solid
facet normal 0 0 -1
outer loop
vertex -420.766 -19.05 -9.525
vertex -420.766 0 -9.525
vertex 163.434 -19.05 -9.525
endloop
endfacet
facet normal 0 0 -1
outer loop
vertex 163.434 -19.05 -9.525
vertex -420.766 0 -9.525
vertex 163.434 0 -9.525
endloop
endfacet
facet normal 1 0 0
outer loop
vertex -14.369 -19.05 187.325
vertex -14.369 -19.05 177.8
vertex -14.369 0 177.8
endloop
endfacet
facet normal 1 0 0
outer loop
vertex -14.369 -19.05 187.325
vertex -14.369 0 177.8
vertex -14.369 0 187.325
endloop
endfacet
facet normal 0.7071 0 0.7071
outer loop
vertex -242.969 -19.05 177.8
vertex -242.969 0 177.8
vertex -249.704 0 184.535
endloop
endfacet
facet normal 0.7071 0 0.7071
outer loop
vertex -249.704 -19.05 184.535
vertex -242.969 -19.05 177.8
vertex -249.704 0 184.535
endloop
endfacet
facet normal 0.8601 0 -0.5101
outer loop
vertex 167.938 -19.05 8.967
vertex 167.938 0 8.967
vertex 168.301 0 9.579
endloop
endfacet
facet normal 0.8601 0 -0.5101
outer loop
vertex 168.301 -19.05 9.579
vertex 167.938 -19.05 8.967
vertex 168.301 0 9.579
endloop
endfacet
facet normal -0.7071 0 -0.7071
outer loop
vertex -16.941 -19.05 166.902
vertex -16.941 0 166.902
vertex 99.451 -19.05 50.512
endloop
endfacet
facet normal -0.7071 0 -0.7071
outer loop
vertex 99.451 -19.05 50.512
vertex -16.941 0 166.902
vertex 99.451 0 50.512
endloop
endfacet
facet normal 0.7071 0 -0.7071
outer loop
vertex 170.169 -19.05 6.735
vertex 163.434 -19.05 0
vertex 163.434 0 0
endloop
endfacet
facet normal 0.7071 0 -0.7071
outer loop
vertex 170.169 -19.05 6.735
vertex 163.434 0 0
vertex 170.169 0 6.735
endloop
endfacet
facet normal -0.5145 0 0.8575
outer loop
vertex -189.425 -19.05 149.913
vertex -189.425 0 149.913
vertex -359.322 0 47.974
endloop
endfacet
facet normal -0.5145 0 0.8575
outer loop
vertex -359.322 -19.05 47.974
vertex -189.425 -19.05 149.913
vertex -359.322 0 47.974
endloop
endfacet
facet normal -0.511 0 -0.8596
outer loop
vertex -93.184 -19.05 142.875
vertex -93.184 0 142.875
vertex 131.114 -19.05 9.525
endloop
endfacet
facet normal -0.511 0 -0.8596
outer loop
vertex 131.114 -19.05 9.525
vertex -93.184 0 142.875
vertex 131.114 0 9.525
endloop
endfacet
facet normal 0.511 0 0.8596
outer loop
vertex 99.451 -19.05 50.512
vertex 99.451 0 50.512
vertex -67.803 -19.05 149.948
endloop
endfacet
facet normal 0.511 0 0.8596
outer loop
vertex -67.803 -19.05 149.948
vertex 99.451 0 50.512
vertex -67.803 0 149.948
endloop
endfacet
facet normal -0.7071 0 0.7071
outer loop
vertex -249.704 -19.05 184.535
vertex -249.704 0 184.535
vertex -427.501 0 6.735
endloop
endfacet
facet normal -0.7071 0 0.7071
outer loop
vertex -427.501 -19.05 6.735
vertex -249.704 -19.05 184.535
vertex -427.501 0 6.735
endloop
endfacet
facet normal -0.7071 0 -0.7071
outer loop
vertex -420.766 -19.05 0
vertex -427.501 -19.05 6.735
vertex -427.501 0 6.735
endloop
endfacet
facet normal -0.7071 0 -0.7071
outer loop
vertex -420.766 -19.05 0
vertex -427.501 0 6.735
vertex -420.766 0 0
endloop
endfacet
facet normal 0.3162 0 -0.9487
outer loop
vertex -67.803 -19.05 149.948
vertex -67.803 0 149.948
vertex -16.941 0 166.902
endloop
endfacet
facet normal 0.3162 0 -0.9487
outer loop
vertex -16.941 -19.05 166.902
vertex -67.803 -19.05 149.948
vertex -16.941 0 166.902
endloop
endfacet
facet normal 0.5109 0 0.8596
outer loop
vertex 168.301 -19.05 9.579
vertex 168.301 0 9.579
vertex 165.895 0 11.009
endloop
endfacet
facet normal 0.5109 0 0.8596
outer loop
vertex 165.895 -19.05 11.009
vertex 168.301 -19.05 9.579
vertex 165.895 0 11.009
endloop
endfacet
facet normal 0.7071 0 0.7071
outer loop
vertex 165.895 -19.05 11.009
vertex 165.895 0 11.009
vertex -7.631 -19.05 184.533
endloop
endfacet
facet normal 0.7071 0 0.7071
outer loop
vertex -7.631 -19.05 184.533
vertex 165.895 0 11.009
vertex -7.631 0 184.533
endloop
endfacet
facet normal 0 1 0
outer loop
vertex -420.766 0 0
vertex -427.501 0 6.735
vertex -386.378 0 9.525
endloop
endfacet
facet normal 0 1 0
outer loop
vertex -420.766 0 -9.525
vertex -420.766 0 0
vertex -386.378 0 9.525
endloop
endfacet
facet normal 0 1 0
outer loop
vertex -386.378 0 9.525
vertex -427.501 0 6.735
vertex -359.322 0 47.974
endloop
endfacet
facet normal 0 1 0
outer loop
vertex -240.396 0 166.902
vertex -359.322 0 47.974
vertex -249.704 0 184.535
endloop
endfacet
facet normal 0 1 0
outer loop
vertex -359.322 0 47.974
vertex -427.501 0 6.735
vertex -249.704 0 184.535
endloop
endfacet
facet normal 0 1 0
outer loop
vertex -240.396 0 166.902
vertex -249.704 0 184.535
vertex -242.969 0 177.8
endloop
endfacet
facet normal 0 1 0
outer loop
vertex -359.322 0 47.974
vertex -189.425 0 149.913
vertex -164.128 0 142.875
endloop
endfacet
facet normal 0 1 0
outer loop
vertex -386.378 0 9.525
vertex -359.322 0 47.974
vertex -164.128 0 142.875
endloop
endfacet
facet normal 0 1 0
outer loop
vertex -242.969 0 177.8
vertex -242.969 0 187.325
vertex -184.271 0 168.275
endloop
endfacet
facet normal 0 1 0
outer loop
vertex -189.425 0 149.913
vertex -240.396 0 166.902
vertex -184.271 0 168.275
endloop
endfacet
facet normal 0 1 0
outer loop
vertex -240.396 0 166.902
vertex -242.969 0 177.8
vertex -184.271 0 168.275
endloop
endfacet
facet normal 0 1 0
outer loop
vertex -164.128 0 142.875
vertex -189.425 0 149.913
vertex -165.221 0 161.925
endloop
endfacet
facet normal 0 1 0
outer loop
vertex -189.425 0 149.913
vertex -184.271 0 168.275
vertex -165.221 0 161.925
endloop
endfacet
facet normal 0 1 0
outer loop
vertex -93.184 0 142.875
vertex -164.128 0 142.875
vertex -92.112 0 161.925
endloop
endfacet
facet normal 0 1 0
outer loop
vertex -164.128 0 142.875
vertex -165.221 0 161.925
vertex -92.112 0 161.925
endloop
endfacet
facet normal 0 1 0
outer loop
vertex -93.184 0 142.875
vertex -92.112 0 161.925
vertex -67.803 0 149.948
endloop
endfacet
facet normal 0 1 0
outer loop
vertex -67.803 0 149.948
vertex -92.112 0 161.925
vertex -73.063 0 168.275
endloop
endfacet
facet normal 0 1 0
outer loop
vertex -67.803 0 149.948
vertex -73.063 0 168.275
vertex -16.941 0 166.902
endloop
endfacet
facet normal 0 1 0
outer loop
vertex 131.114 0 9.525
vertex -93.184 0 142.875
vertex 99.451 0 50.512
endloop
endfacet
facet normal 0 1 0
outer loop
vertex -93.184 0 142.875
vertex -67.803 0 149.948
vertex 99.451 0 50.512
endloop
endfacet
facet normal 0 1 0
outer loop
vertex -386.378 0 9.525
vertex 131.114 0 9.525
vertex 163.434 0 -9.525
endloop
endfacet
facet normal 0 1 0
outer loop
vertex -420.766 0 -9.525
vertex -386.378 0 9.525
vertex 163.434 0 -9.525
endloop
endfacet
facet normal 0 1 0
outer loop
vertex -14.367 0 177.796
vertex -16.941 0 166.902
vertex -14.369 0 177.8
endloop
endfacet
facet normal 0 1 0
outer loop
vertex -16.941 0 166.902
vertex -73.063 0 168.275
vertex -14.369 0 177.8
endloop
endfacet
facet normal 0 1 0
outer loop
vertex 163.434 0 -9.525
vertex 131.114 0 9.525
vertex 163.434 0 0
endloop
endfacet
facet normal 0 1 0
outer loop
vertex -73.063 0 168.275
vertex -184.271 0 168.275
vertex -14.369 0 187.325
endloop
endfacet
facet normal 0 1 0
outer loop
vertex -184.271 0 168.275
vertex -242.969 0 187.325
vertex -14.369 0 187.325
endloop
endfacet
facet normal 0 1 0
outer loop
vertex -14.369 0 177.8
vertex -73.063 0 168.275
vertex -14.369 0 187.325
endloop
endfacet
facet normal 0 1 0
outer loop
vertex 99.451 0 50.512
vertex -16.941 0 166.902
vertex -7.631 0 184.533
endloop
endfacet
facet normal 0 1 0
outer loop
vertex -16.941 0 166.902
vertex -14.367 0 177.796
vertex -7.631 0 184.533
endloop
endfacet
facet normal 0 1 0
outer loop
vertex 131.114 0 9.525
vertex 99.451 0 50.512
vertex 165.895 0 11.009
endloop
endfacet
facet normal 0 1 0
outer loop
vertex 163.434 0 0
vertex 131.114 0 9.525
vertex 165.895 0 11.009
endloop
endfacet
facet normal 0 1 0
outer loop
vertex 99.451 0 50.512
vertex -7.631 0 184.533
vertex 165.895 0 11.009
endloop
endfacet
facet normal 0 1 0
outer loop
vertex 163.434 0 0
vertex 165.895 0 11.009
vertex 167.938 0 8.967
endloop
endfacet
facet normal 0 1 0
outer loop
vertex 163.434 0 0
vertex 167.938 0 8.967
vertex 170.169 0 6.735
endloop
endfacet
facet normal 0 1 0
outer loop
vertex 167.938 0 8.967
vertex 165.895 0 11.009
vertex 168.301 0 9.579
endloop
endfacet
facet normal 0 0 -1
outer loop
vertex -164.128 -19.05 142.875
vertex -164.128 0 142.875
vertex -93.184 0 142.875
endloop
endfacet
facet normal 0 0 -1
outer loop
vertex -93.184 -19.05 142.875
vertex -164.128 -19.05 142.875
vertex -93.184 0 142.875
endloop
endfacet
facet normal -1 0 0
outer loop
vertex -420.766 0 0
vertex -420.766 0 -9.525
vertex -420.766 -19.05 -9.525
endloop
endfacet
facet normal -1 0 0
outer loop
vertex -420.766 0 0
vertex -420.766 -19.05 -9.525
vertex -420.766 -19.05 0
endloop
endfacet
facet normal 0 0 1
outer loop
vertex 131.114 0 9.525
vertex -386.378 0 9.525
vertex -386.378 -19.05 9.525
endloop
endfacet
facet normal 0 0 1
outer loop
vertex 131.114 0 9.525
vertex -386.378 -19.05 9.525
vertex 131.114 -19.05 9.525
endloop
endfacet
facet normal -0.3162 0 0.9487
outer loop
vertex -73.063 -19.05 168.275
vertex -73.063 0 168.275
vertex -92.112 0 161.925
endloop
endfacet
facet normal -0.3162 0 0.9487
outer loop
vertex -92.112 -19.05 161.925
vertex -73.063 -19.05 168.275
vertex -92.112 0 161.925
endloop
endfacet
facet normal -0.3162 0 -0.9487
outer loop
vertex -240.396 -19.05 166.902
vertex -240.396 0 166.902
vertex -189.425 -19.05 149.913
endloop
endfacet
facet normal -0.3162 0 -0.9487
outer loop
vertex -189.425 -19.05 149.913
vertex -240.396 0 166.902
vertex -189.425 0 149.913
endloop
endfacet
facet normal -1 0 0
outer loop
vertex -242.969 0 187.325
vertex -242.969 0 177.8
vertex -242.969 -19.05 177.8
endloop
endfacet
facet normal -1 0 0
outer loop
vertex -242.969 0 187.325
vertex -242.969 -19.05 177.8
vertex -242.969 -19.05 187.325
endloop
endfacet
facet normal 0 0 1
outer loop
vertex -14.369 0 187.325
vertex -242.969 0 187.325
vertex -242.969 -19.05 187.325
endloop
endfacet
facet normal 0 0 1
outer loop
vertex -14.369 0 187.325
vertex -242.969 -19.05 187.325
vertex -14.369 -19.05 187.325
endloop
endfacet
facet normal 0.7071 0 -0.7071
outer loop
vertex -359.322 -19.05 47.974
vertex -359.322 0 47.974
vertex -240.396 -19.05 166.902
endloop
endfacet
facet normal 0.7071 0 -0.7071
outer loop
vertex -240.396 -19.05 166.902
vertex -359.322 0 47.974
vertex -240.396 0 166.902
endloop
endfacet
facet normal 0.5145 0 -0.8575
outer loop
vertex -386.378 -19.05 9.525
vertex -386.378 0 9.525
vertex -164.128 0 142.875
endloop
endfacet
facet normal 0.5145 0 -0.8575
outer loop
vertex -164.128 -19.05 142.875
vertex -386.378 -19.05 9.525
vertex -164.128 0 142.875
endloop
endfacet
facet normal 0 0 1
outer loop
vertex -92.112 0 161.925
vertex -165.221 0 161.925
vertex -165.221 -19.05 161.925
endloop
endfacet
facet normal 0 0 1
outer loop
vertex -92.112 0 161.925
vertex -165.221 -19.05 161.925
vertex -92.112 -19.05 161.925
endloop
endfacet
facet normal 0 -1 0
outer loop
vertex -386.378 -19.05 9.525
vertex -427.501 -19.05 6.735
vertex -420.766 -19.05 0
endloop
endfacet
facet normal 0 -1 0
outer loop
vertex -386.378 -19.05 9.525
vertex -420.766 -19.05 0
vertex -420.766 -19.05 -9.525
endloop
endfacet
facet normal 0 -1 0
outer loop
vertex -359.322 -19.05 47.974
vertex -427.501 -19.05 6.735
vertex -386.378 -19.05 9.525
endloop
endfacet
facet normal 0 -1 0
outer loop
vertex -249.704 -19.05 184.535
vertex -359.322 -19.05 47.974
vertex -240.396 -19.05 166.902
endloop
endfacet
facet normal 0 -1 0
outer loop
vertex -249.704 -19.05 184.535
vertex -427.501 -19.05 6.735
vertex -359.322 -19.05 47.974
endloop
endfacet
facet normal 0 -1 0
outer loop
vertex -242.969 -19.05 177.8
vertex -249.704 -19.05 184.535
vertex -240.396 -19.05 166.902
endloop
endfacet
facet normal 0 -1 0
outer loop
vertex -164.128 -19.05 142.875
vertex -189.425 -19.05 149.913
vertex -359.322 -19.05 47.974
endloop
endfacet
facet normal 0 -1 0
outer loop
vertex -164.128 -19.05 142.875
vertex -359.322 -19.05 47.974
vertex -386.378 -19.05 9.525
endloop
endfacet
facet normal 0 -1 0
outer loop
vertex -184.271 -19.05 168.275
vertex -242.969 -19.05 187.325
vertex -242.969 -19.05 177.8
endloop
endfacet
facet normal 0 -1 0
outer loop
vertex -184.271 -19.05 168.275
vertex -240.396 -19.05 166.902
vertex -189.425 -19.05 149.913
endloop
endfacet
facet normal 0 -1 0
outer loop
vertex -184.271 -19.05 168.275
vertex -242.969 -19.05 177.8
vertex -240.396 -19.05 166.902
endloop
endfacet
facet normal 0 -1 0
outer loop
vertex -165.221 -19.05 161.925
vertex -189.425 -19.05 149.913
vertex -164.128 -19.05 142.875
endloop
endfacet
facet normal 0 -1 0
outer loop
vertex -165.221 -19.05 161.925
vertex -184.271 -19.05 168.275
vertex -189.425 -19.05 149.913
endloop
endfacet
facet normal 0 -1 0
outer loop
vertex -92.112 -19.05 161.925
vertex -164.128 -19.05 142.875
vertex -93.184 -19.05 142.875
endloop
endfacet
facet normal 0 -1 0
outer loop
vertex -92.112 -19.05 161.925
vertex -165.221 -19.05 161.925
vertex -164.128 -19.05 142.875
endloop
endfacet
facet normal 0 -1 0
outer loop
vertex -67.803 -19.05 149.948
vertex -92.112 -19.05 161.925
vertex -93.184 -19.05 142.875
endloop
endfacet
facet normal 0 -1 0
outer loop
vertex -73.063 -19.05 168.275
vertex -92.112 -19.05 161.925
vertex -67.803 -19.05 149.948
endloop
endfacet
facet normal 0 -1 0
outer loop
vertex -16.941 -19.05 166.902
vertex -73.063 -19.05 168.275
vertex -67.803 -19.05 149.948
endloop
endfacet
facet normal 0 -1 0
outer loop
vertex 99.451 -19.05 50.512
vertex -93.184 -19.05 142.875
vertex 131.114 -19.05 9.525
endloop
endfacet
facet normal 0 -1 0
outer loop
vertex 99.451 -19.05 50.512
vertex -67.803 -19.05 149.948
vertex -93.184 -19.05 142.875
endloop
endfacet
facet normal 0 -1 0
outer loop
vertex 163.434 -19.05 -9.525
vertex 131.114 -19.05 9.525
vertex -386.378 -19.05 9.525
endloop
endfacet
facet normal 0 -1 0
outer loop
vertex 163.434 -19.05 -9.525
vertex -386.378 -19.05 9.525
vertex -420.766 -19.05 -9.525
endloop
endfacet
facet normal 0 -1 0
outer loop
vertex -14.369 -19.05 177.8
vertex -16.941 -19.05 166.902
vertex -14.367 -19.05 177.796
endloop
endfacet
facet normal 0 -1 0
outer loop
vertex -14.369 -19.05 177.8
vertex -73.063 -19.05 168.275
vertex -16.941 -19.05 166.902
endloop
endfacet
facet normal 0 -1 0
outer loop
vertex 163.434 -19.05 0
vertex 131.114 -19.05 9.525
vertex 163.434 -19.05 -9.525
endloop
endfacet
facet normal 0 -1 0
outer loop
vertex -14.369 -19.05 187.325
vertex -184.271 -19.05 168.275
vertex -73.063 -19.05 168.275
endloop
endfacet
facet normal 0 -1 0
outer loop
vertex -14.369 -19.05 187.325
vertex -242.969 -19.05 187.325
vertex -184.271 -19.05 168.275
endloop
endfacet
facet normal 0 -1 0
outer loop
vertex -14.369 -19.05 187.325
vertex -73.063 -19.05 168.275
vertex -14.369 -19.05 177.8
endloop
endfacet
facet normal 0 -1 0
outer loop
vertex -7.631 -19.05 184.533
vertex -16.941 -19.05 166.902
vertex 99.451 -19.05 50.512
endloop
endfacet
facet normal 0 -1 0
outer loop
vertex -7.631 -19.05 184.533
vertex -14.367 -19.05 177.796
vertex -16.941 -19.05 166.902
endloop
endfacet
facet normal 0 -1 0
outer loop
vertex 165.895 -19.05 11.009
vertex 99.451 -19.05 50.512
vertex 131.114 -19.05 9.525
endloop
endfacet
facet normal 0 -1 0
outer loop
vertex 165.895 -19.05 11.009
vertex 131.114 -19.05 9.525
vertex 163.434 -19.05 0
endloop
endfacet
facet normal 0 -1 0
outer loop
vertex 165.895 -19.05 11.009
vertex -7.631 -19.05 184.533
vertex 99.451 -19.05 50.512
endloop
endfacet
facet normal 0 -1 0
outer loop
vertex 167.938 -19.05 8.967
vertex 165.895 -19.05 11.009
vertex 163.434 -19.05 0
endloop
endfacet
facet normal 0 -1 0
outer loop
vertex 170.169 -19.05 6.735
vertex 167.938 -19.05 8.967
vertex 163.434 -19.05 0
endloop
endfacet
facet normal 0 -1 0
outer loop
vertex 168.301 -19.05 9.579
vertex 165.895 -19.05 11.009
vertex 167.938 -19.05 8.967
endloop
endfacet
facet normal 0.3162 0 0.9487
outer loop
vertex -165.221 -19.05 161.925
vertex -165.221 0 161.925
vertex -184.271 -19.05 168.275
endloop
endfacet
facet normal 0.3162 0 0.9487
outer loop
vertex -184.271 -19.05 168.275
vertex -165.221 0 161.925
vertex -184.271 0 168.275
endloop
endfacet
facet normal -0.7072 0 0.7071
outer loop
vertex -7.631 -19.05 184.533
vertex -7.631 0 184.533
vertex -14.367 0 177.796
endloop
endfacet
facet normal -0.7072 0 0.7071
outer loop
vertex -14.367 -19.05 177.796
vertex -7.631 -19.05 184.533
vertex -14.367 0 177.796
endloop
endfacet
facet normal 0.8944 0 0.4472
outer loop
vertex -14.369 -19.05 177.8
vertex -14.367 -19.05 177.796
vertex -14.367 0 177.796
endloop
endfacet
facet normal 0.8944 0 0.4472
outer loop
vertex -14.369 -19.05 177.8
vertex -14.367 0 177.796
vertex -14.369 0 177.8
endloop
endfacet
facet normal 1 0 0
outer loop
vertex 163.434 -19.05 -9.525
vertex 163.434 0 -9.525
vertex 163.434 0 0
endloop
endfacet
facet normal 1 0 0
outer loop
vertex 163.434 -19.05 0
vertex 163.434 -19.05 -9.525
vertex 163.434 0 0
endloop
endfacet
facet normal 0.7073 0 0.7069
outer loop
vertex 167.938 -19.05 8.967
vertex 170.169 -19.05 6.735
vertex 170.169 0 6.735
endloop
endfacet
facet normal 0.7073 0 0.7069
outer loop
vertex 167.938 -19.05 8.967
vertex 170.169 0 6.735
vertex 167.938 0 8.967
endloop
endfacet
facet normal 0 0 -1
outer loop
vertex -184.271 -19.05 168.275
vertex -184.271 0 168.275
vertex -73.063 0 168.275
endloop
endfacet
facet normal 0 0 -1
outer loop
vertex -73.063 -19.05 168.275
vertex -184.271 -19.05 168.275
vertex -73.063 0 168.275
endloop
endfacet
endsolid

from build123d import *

# Parameters (mm, degrees)
F8_W      = 584.2
F8_H      = 19.05
F4_W      = 76.2
F4_H      = 19.05
F2_W      = 228.6
F2_H      = 19.05
F10_DEPTH = 19.05


with BuildPart() as f10:
    # F5 (on Front) + F8 (on Front) + F6 (on Front) + F7 (on Front) + F9 (on Front) + F4 (on Front) + F1 (on Front) + F2 (on Front) + F3 (on Front) → F10 (new body)
    with BuildSketch(Plane.XZ):
        Polygon((-93.580917, 161.435332), (-87.556597, 143.362975), (-11.356597, 168.763822), (-17.380917, 186.836178), align=None)
    with BuildSketch(Plane.XZ):
        with Locations((-128.666217, 0)):
            Rectangle(F8_W, F8_H)
    with BuildSketch(Plane.XZ):
        Polygon((-425.666789, 8.16762), (-415.865645, -8.16762), (-161.865645, 144.23238), (-171.666789, 160.56762), align=None)
    with BuildSketch(Plane.XZ):
        Polygon((-21.101361, 171.06222), (156.698639, -6.73524), (170.168927, 6.73524), (-7.631073, 184.5327), align=None)
    with BuildSketch(Plane.XZ):
        Polygon((-85.698658, 160.587338), (-95.433776, 144.212662), (158.566224, -6.796122), (168.301342, 9.578553), align=None)
    with BuildSketch(Plane.XZ):
        with Locations((-128.666217, 152.4)):
            Rectangle(F4_W, F4_H)
    with BuildSketch(Plane.XZ):
        Polygon((-249.703997, 184.535144), (-427.501457, 6.735144), (-414.030977, -6.735144), (-236.233517, 171.064856), align=None)
    with BuildSketch(Plane.XZ):
        with Locations((-128.668757, 177.8)):
            Rectangle(F2_W, F2_H)
    with BuildSketch(Plane.XZ):
        Polygon((-239.645784, 186.732577), (-246.29173, 168.867423), (-170.08665, 143.466576), (-163.445784, 161.333424), align=None)
    extrude(amount=F10_DEPTH)


solid = f10.part
